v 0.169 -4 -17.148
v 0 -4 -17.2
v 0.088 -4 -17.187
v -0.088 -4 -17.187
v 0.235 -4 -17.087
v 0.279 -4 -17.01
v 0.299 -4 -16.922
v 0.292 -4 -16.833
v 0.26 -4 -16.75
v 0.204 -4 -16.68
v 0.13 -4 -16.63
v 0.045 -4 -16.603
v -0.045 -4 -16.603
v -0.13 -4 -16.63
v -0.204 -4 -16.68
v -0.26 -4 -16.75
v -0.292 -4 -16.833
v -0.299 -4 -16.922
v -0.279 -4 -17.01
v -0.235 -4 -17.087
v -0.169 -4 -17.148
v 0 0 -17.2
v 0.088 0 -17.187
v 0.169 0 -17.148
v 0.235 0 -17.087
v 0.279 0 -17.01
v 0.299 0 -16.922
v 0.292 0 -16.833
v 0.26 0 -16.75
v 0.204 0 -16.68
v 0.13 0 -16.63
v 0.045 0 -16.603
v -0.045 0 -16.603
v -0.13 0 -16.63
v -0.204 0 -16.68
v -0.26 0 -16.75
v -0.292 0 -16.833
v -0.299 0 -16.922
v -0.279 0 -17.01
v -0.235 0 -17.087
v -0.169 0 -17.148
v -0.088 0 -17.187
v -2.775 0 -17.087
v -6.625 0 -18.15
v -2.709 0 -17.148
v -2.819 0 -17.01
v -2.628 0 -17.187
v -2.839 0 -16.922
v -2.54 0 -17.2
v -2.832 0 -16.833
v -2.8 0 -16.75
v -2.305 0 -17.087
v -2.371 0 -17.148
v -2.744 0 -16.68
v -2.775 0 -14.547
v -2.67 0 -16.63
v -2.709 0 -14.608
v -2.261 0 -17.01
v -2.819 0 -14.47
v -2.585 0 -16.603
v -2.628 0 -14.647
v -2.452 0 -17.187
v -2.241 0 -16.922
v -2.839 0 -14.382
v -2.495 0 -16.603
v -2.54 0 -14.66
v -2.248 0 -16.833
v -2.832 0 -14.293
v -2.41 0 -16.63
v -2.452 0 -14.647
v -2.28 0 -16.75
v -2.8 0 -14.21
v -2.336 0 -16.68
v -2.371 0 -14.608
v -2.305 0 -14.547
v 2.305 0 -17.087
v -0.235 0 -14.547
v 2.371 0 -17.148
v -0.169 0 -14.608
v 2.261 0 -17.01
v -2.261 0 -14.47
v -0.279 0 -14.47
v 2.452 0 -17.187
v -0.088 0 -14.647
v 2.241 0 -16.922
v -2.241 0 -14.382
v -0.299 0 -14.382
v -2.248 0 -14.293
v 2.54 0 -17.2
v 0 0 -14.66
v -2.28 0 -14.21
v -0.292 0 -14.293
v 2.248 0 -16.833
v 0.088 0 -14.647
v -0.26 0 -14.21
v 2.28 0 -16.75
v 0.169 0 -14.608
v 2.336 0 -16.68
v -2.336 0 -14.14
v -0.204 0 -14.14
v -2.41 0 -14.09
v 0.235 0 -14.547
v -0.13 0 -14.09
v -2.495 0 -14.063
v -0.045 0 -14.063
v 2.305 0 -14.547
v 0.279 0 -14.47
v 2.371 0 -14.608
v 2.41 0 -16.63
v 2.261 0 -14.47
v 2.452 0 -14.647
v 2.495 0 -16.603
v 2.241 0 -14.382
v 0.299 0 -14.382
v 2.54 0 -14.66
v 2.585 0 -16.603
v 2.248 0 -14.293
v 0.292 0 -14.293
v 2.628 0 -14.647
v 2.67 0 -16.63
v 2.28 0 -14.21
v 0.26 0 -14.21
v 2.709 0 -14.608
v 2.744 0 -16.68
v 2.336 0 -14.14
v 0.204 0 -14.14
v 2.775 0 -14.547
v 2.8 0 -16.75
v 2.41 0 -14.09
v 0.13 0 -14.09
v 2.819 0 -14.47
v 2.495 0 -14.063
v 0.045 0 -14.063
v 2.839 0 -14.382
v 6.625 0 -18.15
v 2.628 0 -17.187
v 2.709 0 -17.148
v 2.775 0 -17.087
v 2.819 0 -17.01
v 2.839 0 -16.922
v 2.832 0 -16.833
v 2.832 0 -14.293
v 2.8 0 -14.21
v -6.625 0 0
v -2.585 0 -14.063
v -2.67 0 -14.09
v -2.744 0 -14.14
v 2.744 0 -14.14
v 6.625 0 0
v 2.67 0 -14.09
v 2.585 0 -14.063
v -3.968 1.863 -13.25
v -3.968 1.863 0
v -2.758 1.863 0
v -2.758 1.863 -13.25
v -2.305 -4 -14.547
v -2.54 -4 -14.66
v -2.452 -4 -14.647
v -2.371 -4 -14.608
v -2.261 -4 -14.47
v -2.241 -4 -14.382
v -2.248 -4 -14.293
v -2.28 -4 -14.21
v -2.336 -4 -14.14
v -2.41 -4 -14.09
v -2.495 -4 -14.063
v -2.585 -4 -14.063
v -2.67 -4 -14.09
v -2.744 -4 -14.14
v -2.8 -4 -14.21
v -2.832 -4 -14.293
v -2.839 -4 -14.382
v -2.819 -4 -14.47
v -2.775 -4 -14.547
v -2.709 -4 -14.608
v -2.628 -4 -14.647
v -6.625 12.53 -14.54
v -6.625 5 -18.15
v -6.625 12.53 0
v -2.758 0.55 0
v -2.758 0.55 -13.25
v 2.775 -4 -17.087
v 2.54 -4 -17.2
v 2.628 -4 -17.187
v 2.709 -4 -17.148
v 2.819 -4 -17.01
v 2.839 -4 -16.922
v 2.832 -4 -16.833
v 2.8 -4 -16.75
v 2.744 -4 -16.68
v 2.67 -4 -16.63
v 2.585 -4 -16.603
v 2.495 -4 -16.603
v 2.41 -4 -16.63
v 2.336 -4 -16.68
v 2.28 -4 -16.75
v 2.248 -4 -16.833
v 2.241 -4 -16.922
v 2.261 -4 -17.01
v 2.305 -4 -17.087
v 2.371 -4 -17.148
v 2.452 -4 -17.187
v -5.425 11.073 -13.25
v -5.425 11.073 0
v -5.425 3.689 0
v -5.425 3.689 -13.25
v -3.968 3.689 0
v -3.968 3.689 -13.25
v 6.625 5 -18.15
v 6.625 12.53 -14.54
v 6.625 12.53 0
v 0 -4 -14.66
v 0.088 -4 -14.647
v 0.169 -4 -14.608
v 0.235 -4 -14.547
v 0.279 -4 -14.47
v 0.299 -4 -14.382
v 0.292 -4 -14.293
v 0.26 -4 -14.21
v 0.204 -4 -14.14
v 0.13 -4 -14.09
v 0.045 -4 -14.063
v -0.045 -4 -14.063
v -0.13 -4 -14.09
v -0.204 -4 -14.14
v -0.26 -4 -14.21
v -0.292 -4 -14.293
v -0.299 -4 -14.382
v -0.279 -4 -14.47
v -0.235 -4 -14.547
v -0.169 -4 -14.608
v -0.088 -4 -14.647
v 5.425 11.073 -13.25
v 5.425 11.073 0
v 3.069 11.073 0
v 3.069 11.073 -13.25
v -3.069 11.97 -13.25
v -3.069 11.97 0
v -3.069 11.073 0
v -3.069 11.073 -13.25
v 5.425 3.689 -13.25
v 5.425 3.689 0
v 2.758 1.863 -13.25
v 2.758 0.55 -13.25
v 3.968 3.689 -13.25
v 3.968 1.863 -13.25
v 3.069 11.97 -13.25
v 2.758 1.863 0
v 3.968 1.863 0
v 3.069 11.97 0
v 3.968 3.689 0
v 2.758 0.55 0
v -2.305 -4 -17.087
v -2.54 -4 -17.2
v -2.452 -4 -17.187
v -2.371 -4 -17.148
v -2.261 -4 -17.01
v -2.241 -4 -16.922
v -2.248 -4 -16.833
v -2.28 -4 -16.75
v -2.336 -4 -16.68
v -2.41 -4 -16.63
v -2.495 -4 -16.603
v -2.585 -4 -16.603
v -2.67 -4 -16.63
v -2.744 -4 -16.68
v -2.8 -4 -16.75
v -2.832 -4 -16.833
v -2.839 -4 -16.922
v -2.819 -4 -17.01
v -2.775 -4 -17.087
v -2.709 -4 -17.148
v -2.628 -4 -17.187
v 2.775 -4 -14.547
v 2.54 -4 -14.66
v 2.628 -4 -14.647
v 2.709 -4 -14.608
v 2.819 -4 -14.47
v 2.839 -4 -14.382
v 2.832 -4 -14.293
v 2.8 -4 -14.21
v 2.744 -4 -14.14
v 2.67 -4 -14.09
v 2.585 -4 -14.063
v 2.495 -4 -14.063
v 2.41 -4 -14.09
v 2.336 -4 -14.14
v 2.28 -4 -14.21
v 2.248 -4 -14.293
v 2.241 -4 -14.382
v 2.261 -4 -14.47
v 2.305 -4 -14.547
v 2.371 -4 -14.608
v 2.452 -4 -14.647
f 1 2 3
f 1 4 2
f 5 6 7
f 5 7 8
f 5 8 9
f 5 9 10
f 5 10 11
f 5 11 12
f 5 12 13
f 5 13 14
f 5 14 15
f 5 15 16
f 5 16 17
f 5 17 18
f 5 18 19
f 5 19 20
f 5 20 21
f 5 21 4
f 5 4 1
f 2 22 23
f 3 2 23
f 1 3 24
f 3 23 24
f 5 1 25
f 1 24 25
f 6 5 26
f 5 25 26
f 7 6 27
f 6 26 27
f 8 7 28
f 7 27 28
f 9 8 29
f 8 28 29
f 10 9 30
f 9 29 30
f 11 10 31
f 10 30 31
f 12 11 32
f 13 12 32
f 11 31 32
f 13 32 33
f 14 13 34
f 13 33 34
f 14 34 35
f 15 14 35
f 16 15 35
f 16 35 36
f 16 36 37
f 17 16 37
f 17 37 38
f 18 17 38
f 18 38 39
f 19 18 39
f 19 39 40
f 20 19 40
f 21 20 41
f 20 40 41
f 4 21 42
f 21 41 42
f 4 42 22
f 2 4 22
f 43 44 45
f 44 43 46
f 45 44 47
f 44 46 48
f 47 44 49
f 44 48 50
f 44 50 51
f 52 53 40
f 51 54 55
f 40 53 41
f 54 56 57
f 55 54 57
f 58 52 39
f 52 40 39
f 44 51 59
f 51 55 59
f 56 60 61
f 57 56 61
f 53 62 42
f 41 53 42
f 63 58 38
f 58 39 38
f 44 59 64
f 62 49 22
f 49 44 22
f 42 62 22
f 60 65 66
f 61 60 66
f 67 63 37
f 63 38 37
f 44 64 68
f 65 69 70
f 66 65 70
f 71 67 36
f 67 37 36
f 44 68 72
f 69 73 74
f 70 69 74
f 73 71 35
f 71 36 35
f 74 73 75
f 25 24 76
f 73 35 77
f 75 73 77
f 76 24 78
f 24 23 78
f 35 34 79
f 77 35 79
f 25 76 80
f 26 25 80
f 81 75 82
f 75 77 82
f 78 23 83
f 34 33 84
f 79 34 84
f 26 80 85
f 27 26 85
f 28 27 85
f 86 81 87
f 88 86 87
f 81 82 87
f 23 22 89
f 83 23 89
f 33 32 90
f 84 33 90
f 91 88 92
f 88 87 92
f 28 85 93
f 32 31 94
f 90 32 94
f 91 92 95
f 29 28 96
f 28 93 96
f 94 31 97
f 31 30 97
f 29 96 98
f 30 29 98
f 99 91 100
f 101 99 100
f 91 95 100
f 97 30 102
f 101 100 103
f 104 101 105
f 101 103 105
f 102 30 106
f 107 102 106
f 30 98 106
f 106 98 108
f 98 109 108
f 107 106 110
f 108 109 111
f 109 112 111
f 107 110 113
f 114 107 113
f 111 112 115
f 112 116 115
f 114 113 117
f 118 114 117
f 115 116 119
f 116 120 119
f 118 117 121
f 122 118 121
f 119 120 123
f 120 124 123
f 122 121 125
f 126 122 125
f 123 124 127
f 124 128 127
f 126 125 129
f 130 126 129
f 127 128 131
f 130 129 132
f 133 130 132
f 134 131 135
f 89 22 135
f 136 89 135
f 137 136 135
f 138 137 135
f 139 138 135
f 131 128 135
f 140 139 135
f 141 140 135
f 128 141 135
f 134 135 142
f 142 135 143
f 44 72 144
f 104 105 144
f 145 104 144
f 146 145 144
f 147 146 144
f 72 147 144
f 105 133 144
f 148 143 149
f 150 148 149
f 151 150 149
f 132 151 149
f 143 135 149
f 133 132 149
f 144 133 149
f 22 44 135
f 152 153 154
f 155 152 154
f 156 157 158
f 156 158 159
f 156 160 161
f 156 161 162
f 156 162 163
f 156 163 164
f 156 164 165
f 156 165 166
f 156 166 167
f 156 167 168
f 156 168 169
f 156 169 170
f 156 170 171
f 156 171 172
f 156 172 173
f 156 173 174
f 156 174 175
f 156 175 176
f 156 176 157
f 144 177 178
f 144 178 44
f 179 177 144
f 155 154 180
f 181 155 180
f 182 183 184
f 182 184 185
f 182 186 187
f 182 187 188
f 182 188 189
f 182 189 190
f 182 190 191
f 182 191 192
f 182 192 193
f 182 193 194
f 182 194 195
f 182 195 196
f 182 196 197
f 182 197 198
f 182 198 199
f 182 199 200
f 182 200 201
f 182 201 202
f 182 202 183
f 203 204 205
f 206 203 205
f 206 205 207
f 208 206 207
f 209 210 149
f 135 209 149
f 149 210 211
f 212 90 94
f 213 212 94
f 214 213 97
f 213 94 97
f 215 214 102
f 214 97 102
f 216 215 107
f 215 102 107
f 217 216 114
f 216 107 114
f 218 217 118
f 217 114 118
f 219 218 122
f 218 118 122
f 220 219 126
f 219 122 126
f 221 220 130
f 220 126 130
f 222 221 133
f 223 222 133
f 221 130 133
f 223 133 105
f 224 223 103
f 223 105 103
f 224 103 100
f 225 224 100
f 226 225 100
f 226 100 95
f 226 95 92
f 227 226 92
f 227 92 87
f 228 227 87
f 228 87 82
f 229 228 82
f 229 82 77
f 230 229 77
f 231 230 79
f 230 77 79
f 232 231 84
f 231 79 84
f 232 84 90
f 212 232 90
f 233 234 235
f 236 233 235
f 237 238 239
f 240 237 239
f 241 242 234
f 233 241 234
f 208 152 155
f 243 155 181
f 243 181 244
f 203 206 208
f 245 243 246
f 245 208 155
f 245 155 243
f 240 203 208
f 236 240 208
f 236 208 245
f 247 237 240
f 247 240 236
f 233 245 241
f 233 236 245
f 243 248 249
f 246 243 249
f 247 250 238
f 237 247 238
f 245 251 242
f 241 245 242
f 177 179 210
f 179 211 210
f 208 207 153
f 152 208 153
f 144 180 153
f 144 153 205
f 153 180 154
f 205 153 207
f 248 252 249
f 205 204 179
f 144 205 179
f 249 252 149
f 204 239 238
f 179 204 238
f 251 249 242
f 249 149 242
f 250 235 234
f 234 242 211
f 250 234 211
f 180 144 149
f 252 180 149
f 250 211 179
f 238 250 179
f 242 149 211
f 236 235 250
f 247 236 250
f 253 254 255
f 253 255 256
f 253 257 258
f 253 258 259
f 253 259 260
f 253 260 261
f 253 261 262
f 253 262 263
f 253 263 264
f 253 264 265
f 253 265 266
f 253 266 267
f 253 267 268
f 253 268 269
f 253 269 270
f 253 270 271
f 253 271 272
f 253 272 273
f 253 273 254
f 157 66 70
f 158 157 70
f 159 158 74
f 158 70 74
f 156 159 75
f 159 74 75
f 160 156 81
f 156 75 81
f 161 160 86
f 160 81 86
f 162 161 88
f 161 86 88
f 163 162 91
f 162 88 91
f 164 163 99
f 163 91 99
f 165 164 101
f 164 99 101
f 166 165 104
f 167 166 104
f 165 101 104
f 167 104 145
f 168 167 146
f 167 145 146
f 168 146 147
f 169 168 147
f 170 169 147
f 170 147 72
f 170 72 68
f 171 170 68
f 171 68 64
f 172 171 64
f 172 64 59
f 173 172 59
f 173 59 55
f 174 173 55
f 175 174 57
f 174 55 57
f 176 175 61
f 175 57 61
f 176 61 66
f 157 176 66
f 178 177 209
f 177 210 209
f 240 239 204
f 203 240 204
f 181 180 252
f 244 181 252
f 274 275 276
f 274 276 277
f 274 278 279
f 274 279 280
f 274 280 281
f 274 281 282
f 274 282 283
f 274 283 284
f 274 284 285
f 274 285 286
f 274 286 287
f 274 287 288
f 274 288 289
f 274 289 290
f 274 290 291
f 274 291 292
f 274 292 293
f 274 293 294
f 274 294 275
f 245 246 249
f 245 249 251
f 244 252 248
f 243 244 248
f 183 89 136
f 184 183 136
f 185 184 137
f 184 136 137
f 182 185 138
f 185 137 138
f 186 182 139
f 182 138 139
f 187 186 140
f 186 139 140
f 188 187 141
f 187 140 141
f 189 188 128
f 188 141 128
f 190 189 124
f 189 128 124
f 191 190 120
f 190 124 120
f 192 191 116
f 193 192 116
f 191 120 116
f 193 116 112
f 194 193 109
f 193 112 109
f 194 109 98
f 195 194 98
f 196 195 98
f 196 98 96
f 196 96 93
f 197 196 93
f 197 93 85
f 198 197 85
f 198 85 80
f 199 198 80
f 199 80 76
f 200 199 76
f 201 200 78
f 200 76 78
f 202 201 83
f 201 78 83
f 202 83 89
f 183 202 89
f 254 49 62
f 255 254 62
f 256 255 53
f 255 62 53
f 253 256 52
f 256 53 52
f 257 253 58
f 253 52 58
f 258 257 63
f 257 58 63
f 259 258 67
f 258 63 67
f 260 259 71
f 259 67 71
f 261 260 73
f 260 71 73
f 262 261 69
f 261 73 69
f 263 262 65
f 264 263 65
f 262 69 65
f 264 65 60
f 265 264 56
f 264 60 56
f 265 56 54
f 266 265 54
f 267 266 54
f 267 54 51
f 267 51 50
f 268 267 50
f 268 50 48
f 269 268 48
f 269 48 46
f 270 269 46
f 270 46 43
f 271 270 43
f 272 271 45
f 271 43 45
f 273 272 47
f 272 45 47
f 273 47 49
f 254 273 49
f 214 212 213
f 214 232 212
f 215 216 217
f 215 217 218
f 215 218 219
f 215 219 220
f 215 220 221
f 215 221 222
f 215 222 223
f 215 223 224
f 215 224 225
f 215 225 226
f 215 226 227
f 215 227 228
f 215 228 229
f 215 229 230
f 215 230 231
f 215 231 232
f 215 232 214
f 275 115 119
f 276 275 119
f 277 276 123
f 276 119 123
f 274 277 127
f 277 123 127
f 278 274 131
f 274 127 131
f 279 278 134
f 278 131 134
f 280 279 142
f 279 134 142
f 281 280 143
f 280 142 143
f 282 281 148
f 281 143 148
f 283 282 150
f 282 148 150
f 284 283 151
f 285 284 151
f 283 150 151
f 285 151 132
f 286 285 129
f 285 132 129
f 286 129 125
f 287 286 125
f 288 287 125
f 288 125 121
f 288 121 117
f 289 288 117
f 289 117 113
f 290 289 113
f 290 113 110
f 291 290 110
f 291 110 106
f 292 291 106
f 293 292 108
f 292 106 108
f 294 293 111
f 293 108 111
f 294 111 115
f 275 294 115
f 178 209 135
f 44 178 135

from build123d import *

# Parameters (mm, degrees)
BOSS_EXTRUDE1_DEPTH = 6.625
CUT_EXTRUDE1_DEPTH  = 13.25
SKETCH3_R           = 0.3
BOSS_EXTRUDE2_DEPTH = 4


with BuildPart() as part:
    # Sketch1 → Boss-Extrude1 (new, symmetric)
    with BuildSketch(Plane(origin=(0, 0, 0), x_dir=(0, 0, -1), z_dir=(1, 0, 0))):
        Polygon((0, 0), (0, 12.53), (14.54, 12.53), (18.15, 5), (18.15, 0), align=None)
    extrude(amount=BOSS_EXTRUDE1_DEPTH, both=True)

    # Sketch2 → Cut-Extrude1 (cut)
    with BuildSketch(Plane.XY):
        Polygon((-2.758412662, 1.863268477), (-2.758412662, 0.55), (2.758412662, 0.55), (2.758412662, 1.863268477), (3.967697722, 1.863268477), (3.967697722, 3.689249531), (5.425, 3.689249531), (5.425, 11.073209492), (3.069315997, 11.073209492), (3.069315997, 11.97), (-3.069315997, 11.97), (-3.069315997, 11.073209492), (-5.425, 11.073209492), (-5.425, 3.689249531), (-3.967697722, 3.689249531), (-3.967697722, 1.863268477), align=None)
    extrude(amount=-CUT_EXTRUDE1_DEPTH, mode=Mode.SUBTRACT)

    # Sketch3 → Boss-Extrude2 (add)
    with BuildSketch(Plane.XZ):
        with Locations(Location((2.54, -16.9, 0), (0, 0, 270))):
            Circle(SKETCH3_R)
        with Locations(Location((0, -16.9, 0), (0, 0, 270))):
            Circle(SKETCH3_R)
        with Locations(Location((-2.54, -16.9, 0), (0, 0, 270))):
            Circle(SKETCH3_R)
        with Locations(Location((0, -14.36, 0), (0, 0, 270))):
            Circle(SKETCH3_R)
        with Locations(Location((-2.54, -14.36, 0), (0, 0, 270))):
            Circle(SKETCH3_R)
        with Locations(Location((2.54, -14.36, 0), (0, 0, 270))):
            Circle(SKETCH3_R)
    extrude(amount=BOSS_EXTRUDE2_DEPTH)


solid = part.part
